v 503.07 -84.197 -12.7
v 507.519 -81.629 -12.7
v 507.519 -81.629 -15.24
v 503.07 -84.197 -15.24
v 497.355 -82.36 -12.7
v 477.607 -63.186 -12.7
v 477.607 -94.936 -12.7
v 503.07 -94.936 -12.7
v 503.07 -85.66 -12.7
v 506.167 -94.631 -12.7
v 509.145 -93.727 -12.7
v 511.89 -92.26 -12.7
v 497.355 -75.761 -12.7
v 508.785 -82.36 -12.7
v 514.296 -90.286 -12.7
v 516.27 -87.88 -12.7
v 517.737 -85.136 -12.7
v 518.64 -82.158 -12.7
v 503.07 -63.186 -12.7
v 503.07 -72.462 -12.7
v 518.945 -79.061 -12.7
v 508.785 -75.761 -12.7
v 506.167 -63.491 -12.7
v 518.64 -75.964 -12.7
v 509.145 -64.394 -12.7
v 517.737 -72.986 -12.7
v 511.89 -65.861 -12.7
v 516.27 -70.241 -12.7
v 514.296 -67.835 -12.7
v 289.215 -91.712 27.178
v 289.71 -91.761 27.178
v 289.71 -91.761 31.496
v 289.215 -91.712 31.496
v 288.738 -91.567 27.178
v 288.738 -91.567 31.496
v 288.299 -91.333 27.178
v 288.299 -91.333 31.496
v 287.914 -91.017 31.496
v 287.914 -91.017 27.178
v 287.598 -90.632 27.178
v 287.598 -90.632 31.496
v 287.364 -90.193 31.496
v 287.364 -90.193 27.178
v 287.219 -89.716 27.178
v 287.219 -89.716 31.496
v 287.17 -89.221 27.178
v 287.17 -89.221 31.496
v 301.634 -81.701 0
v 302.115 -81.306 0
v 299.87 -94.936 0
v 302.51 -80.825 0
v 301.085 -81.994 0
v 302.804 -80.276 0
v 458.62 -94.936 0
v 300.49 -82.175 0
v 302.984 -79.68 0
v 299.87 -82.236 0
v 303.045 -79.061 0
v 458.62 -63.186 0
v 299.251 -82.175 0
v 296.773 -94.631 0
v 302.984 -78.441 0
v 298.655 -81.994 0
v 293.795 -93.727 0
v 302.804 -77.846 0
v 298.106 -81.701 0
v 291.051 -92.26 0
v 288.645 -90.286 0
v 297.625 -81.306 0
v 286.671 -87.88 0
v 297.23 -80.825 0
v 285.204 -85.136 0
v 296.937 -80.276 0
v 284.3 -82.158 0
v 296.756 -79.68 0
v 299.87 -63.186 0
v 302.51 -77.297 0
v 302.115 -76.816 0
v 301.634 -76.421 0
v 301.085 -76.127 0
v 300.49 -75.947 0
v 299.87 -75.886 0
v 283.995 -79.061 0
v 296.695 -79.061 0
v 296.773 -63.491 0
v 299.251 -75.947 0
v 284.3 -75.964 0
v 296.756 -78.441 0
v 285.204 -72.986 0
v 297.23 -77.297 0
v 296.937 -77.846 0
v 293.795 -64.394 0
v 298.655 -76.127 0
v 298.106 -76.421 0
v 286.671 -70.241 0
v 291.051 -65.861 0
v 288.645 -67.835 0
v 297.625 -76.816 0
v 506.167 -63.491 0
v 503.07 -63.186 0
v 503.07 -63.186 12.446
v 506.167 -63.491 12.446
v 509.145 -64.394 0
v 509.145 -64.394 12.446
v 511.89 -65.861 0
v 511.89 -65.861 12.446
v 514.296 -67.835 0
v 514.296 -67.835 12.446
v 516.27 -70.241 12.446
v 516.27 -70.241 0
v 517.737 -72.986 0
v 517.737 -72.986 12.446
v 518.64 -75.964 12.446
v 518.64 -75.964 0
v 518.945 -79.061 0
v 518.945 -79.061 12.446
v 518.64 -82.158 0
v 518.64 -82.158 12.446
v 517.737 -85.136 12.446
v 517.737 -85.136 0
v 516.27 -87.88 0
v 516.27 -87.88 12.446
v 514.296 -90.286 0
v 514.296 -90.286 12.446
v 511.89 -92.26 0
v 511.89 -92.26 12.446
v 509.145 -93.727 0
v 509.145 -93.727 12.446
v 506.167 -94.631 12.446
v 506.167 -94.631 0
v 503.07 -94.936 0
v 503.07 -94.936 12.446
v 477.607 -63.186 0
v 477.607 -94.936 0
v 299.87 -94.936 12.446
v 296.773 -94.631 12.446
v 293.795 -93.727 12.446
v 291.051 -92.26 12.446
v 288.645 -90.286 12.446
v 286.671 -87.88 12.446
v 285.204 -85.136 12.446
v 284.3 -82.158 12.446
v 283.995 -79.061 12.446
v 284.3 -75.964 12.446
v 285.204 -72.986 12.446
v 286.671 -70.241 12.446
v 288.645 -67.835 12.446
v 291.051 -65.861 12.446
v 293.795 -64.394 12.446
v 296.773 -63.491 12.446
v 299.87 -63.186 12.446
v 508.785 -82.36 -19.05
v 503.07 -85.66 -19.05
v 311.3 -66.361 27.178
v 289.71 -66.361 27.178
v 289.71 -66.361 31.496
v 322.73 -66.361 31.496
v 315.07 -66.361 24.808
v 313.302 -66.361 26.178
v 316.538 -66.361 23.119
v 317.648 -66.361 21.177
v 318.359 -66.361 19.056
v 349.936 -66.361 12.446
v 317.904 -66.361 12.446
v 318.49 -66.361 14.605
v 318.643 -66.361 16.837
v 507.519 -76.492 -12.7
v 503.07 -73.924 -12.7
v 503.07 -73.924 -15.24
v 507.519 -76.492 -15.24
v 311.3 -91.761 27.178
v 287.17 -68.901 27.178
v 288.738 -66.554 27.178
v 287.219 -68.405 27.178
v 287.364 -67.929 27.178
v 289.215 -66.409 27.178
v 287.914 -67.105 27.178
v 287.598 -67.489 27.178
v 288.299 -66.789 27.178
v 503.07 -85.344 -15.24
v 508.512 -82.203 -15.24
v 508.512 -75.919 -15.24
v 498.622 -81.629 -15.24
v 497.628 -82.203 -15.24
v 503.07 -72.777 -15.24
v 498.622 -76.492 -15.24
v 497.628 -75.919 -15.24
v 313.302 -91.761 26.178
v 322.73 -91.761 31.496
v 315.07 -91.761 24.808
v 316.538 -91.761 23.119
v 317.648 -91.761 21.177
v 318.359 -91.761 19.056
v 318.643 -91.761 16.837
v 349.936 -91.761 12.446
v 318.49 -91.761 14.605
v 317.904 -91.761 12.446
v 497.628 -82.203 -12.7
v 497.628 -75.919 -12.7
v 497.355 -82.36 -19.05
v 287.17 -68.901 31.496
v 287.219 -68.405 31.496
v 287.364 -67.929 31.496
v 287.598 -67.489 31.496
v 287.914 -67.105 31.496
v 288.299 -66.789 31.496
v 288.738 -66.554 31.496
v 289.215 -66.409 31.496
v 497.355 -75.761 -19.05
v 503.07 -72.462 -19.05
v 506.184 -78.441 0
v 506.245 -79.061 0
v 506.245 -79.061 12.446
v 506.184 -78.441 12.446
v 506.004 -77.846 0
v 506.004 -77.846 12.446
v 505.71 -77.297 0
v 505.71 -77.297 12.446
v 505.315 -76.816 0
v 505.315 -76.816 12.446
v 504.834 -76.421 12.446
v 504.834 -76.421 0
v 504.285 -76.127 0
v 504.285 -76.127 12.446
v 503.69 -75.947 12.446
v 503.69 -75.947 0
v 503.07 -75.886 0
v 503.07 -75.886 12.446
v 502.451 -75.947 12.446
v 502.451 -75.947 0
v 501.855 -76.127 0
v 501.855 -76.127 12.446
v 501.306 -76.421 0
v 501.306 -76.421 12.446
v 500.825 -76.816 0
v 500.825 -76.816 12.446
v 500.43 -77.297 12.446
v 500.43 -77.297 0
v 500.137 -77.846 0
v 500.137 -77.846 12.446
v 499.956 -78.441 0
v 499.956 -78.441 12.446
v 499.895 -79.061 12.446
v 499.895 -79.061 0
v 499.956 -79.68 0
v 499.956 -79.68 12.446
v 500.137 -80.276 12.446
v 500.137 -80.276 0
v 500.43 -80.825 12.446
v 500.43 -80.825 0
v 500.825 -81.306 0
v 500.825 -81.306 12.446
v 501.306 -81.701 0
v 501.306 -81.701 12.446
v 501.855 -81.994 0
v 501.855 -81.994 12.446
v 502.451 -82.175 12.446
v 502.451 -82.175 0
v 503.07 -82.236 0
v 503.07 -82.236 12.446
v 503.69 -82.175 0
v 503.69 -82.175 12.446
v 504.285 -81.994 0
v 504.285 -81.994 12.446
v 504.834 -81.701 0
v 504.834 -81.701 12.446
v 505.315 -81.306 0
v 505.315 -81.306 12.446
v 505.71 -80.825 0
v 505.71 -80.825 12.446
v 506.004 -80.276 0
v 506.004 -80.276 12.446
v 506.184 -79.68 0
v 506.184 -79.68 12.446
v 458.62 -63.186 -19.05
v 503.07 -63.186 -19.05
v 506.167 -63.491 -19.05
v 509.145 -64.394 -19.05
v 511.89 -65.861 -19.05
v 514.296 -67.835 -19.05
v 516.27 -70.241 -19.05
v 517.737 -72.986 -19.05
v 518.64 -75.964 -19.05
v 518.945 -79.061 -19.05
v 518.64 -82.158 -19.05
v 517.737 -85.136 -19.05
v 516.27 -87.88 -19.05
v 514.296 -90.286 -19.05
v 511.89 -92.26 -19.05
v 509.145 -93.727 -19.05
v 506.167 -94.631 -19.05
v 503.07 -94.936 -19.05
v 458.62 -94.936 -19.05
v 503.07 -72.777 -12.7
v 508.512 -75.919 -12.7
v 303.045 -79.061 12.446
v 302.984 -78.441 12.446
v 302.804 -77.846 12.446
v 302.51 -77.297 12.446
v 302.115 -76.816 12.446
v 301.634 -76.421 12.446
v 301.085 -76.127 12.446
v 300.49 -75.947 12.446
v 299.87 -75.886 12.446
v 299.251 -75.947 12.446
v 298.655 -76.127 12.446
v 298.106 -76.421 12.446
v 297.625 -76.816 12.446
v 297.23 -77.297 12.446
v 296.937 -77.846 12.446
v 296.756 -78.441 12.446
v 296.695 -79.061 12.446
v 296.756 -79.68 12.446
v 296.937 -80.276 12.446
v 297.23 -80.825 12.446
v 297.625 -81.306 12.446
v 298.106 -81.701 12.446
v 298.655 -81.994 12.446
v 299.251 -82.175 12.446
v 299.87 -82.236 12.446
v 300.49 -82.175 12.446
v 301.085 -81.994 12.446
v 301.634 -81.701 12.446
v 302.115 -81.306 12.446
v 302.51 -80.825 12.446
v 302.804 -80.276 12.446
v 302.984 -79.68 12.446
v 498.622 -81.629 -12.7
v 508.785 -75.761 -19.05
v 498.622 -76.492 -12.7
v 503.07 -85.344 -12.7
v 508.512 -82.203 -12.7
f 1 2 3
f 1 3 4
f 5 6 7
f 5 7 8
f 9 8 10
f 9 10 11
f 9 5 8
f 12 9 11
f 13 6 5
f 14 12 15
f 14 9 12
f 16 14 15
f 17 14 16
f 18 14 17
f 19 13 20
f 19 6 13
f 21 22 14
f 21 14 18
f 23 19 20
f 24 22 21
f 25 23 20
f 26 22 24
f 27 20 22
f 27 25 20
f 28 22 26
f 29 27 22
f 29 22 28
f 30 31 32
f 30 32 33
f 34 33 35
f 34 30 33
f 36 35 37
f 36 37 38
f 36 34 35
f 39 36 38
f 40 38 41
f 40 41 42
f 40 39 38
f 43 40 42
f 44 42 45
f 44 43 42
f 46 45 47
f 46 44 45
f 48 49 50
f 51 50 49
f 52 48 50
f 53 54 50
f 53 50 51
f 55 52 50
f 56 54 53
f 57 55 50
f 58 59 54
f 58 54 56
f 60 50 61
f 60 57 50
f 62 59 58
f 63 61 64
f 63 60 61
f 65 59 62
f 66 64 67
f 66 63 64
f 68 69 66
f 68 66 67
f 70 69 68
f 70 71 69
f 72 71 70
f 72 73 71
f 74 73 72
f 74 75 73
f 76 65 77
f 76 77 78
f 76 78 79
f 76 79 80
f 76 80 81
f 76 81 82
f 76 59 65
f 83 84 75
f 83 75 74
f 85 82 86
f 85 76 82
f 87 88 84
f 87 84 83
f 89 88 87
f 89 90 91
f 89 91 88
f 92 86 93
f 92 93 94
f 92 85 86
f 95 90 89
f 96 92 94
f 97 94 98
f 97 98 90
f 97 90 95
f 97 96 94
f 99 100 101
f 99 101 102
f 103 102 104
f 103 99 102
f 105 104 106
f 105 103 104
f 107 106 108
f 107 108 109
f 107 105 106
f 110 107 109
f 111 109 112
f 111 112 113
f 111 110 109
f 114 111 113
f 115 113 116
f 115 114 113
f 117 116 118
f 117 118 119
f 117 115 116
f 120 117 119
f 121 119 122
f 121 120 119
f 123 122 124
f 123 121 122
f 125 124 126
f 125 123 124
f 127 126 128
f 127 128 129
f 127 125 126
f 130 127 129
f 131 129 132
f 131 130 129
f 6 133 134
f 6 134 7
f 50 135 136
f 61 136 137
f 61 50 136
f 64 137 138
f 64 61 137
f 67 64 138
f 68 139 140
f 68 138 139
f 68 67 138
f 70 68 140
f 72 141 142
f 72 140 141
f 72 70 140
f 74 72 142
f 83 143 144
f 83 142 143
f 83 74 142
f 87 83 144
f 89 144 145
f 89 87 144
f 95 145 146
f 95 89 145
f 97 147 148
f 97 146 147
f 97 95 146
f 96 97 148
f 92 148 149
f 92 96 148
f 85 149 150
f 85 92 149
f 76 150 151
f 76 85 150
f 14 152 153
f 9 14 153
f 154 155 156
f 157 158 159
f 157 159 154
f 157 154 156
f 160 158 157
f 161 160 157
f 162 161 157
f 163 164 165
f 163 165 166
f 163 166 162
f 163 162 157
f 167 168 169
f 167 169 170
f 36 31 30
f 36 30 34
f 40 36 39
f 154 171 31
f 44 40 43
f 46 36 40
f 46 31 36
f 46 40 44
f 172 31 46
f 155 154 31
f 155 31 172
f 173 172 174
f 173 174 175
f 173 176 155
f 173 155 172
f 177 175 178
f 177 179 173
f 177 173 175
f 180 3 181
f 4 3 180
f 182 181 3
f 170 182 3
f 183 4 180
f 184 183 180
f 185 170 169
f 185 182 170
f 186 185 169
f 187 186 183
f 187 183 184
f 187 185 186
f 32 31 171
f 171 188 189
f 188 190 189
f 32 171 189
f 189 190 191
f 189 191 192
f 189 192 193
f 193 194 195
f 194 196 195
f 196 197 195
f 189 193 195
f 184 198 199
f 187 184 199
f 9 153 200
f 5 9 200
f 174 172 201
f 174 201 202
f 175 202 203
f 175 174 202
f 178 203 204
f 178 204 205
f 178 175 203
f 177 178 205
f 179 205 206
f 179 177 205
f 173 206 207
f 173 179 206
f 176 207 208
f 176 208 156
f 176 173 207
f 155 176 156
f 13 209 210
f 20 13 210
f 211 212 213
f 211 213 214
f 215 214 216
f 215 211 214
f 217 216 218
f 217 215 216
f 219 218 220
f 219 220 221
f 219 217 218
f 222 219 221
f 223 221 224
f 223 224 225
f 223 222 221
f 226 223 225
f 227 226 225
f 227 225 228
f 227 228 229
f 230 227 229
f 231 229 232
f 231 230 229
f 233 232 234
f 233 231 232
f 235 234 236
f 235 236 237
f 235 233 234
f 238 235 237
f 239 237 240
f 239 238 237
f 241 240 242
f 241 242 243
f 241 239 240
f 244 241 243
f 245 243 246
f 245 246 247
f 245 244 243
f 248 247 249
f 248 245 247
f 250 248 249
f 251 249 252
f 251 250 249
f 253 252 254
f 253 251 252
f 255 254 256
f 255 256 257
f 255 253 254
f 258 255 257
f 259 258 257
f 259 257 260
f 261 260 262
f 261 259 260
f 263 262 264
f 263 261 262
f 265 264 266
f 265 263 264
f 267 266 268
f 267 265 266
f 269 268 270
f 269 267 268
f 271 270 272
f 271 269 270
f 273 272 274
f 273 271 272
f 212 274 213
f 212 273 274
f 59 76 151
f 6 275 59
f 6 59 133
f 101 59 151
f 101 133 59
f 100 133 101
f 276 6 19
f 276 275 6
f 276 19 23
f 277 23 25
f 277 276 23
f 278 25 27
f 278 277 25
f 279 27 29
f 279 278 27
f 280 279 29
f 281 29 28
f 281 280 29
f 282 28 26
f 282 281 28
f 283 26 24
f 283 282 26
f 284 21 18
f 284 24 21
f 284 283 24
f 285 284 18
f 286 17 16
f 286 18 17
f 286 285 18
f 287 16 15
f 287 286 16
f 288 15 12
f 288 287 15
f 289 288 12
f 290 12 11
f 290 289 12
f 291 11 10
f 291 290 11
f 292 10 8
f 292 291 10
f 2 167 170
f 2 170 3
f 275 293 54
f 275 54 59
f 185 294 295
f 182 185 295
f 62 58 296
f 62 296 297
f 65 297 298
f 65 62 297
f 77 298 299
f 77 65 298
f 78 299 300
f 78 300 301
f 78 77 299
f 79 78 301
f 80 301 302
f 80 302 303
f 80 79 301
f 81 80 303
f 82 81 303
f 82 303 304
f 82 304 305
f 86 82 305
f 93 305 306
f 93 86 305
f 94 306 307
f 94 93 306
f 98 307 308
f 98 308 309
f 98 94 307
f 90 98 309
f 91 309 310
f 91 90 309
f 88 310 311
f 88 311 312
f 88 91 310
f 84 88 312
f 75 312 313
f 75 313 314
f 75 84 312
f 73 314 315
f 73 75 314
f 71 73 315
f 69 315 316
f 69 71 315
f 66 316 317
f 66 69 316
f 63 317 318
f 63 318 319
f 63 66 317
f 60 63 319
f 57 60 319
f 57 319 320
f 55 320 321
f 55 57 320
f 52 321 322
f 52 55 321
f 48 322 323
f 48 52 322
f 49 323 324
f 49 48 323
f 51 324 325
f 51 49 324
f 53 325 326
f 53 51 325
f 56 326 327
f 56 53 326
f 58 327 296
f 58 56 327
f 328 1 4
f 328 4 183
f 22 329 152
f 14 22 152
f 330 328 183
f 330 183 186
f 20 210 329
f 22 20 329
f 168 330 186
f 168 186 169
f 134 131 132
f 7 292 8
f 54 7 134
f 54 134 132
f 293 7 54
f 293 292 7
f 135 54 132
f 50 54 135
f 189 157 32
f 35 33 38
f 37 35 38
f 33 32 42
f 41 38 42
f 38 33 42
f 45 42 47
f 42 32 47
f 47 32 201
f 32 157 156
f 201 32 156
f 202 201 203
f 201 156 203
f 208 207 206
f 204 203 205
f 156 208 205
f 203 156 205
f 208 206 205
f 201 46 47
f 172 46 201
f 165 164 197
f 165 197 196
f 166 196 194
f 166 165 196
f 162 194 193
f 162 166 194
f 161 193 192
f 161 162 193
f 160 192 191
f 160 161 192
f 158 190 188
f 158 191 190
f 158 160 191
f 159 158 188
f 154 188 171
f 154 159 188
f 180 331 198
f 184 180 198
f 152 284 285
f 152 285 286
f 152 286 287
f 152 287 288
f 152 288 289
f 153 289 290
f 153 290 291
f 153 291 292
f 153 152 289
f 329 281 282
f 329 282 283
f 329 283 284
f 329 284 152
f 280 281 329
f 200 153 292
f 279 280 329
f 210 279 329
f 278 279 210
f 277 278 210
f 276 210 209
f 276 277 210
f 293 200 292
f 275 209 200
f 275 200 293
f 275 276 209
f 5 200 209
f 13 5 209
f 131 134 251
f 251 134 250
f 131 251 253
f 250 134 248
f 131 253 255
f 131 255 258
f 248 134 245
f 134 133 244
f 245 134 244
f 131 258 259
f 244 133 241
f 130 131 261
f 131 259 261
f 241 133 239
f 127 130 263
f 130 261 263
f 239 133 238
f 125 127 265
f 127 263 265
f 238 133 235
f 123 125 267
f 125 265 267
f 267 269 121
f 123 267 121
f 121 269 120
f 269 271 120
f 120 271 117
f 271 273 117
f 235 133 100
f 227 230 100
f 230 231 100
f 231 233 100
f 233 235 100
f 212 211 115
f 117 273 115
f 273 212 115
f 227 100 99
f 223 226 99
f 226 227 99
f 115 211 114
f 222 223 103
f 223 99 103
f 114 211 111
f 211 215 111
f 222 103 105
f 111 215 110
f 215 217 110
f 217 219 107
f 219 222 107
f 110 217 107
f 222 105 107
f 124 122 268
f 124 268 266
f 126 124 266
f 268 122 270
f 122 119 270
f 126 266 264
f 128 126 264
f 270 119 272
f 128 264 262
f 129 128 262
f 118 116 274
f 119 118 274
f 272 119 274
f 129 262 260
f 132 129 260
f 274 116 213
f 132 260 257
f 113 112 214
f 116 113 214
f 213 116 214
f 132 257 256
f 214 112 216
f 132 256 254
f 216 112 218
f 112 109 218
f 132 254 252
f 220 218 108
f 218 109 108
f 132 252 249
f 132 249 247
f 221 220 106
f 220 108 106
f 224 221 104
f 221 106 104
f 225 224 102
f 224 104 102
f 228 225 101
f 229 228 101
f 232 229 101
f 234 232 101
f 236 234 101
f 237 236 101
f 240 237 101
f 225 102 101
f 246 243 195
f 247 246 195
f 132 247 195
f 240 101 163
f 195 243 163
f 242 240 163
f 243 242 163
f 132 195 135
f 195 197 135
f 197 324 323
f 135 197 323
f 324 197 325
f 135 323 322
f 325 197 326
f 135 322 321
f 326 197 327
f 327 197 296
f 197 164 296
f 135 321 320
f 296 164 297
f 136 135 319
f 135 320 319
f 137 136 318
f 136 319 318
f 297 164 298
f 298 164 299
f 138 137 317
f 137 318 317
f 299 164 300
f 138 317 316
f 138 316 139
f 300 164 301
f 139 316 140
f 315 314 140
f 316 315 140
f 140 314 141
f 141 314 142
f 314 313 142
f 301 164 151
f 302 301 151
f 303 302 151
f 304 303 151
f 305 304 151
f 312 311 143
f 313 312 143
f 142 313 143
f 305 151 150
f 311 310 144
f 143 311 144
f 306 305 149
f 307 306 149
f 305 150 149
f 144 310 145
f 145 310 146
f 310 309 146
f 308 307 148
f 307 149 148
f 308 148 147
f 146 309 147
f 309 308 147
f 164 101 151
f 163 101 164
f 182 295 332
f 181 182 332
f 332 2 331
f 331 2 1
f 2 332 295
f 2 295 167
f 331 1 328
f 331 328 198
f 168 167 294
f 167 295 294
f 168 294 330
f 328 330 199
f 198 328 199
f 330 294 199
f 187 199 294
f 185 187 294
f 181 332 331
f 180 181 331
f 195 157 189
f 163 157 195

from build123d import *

# Parameters (mm, degrees)
SKETCH1_R            = 3.175
BOSS_EXTRUDE1_DEPTH  = 12.446
BOSS_EXTRUDE8_DEPTH  = 19.05
CUT_EXTRUDE3_DEPTH   = 41.148
BOSS_EXTRUDE9_DEPTH  = 25.4
BOSS_EXTRUDE10_START = 19.05
BOSS_EXTRUDE10_DEPTH = 19.05
SKETCH11_W           = 41.338406503
SKETCH11_H           = 12.7
CUT_EXTRUDE4_DEPTH   = 35.56
BOSS_EXTRUDE11_DEPTH = 2.54


with BuildPart() as part:
    # Sketch1 → Boss-Extrude1 (new body)
    with BuildSketch(Plane.XY):
        with BuildLine():
            Line((299.870251741, -63.185614448), (503.070251741, -63.185614448))
            ThreePointArc((503.070251741, -63.185614448), (518.945251741, -79.060614448), (503.070251741, -94.935614448))
            Line((503.070251741, -94.935614448), (299.870251741, -94.935614448))
            ThreePointArc((299.870251741, -94.935614448), (283.995251741, -79.060614448), (299.870251741, -63.185614448))
        make_face()
        with Locations((299.870251741, -79.060614448)):
            Circle(SKETCH1_R, mode=Mode.SUBTRACT)
        with Locations((503.070251741, -79.060614448)):
            Circle(SKETCH1_R, mode=Mode.SUBTRACT)
    extrude(amount=BOSS_EXTRUDE1_DEPTH)

    # Sketch7 → Boss-Extrude8 (add)
    with BuildSketch(Plane.XY.offset(12.446)):
        with BuildLine():
            Line((310.030251741, -66.360614448), (312.570251741, -66.360614448))
            Line((312.570251741, -66.360614448), (322.730251741, -66.360614448))
            Line((322.730251741, -66.360614448), (322.730251741, -91.760614448))
            Line((322.730251741, -91.760614448), (310.030251741, -91.760614448))
            Line((310.030251741, -91.760614448), (289.710251741, -91.760614448))
            ThreePointArc((289.710251741, -91.760614448), (287.914200517, -91.016665672), (287.170251741, -89.220614448))
            Line((287.170251741, -89.220614448), (287.170251741, -68.900614448))
            ThreePointArc((287.170251741, -68.900614448), (287.914200517, -67.104563223), (289.710251741, -66.360614448))
            Line((289.710251741, -66.360614448), (310.030251741, -66.360614448))
        make_face()
    extrude(amount=BOSS_EXTRUDE8_DEPTH)

    # Sketch8 → Cut-Extrude3 (cut)
    with BuildSketch(Plane(origin=(0, -66.360614448, 0), x_dir=(1, 0, 0), z_dir=(0, 1, 0))):
        with BuildLine():
            Line((287.170251741, -12.446), (317.904251741, -12.446))
            ThreePointArc((317.904251741, -12.446), (317.648023156, -21.177345807), (311.300251741, -27.178))
            Line((311.300251741, -27.178), (287.170251741, -27.178))
            Line((287.170251741, -27.178), (287.170251741, -12.446))
        make_face()
    extrude(amount=-CUT_EXTRUDE3_DEPTH, mode=Mode.SUBTRACT)

    # Sketch9 → Boss-Extrude9 (add)
    with BuildSketch(Plane(origin=(0, -66.360614448, 0), x_dir=(1, 0, 0), z_dir=(0, 1, 0))):
        Polygon((322.730251741, -31.496), (349.936471269, -12.446), (322.730251741, -12.446), align=None)
    extrude(amount=-BOSS_EXTRUDE9_DEPTH)

    # Sketch10 → Boss-Extrude10 (add)
    with BuildSketch(Plane(origin=(0, 0, 0), x_dir=(-1, 0, 0), z_dir=(0, 0, -1)).offset(BOSS_EXTRUDE10_START)):
        with BuildLine():
            Line((-503.070251741, -94.935614448), (-458.620251741, -94.935614448))
            Line((-458.620251741, -94.935614448), (-458.620251741, -63.185614448))
            Line((-458.620251741, -63.185614448), (-503.070251741, -63.185614448))
            ThreePointArc((-503.070251741, -63.185614448), (-518.945251741, -79.060614448), (-503.070251741, -94.935614448))
        make_face()
        Polygon((-503.070251741, -72.461500871), (-508.785251741, -75.761057659), (-508.785251741, -82.360171236), (-503.070251741, -85.659728024), (-497.355251741, -82.360171236), (-497.355251741, -75.761057659), align=None, mode=Mode.SUBTRACT)
    extrude(amount=-BOSS_EXTRUDE10_DEPTH)

    # Sketch11 → Cut-Extrude4 (cut)
    with BuildSketch(Plane(origin=(0, -63.185614448, 0), x_dir=(1, 0, 0), z_dir=(0, 1, 0))):
        with Locations((498.276048489, 6.35)):
            Rectangle(SKETCH11_W, SKETCH11_H)
    extrude(amount=-CUT_EXTRUDE4_DEPTH, mode=Mode.SUBTRACT)


with BuildPart() as body_2:
    # Sketch13 → Boss-Extrude11 (new body)
    with BuildSketch(Plane(origin=(0, 0, -12.7), x_dir=(-1, 0, 0), z_dir=(0, 0, -1))):
        Polygon((-503.070251741, -72.776791853), (-508.512201741, -75.91870315), (-508.512201741, -82.202525745), (-503.070251741, -85.344437042), (-497.628301741, -82.202525745), (-497.628301741, -75.91870315), align=None)
        Polygon((-503.070251741, -73.924110105), (-507.518594988, -76.492362276), (-507.518594988, -81.628866619), (-503.070251741, -84.19711879), (-498.621908494, -81.628866619), (-498.621908494, -76.492362276), align=None, mode=Mode.SUBTRACT)
    extrude(amount=BOSS_EXTRUDE11_DEPTH)


solid = Compound([part.part, body_2.part])
